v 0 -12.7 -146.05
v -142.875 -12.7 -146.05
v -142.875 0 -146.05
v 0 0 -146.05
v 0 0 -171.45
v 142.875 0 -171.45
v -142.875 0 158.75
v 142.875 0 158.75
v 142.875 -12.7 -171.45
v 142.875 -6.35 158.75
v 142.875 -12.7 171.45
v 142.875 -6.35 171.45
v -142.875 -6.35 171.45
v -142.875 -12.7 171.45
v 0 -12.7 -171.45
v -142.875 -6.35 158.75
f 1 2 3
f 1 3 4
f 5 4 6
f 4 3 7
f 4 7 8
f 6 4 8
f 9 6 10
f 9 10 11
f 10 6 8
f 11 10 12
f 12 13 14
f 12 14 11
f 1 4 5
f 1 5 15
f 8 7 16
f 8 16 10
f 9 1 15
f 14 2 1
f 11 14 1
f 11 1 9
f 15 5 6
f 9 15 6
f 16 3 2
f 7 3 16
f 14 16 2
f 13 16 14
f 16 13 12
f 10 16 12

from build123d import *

# Parameters (mm, degrees)
F0_W     = 285.75
F0_H     = 342.9
F1_DEPTH = 12.7
F2_W     = 142.875
F2_H     = 12.7
F3_DEPTH = 25.4
F4_W     = 285.75
F4_H     = 6.35
F5_DEPTH = 12.7


with BuildPart() as f1:
    # F0 (on Front) → F1 (new body)
    with BuildSketch(Plane.XZ):
        Rectangle(F0_W, F0_H)
    extrude(amount=F1_DEPTH)

    # F2 (on face) → F3 (cut)
    with BuildSketch(Plane(origin=(0, 0, -171.45), x_dir=(1, 0, 0), z_dir=(0, 0, -1))):
        with Locations((-71.4375, 6.35)):
            Rectangle(F2_W, F2_H)
    extrude(amount=-F3_DEPTH, mode=Mode.SUBTRACT)

    # F4 (on face) → F5 (cut)
    with BuildSketch(Plane.XY.offset(171.45)):
        with Locations((0, -3.175)):
            Rectangle(F4_W, F4_H)
    extrude(amount=-F5_DEPTH, mode=Mode.SUBTRACT)


solid = f1.part
